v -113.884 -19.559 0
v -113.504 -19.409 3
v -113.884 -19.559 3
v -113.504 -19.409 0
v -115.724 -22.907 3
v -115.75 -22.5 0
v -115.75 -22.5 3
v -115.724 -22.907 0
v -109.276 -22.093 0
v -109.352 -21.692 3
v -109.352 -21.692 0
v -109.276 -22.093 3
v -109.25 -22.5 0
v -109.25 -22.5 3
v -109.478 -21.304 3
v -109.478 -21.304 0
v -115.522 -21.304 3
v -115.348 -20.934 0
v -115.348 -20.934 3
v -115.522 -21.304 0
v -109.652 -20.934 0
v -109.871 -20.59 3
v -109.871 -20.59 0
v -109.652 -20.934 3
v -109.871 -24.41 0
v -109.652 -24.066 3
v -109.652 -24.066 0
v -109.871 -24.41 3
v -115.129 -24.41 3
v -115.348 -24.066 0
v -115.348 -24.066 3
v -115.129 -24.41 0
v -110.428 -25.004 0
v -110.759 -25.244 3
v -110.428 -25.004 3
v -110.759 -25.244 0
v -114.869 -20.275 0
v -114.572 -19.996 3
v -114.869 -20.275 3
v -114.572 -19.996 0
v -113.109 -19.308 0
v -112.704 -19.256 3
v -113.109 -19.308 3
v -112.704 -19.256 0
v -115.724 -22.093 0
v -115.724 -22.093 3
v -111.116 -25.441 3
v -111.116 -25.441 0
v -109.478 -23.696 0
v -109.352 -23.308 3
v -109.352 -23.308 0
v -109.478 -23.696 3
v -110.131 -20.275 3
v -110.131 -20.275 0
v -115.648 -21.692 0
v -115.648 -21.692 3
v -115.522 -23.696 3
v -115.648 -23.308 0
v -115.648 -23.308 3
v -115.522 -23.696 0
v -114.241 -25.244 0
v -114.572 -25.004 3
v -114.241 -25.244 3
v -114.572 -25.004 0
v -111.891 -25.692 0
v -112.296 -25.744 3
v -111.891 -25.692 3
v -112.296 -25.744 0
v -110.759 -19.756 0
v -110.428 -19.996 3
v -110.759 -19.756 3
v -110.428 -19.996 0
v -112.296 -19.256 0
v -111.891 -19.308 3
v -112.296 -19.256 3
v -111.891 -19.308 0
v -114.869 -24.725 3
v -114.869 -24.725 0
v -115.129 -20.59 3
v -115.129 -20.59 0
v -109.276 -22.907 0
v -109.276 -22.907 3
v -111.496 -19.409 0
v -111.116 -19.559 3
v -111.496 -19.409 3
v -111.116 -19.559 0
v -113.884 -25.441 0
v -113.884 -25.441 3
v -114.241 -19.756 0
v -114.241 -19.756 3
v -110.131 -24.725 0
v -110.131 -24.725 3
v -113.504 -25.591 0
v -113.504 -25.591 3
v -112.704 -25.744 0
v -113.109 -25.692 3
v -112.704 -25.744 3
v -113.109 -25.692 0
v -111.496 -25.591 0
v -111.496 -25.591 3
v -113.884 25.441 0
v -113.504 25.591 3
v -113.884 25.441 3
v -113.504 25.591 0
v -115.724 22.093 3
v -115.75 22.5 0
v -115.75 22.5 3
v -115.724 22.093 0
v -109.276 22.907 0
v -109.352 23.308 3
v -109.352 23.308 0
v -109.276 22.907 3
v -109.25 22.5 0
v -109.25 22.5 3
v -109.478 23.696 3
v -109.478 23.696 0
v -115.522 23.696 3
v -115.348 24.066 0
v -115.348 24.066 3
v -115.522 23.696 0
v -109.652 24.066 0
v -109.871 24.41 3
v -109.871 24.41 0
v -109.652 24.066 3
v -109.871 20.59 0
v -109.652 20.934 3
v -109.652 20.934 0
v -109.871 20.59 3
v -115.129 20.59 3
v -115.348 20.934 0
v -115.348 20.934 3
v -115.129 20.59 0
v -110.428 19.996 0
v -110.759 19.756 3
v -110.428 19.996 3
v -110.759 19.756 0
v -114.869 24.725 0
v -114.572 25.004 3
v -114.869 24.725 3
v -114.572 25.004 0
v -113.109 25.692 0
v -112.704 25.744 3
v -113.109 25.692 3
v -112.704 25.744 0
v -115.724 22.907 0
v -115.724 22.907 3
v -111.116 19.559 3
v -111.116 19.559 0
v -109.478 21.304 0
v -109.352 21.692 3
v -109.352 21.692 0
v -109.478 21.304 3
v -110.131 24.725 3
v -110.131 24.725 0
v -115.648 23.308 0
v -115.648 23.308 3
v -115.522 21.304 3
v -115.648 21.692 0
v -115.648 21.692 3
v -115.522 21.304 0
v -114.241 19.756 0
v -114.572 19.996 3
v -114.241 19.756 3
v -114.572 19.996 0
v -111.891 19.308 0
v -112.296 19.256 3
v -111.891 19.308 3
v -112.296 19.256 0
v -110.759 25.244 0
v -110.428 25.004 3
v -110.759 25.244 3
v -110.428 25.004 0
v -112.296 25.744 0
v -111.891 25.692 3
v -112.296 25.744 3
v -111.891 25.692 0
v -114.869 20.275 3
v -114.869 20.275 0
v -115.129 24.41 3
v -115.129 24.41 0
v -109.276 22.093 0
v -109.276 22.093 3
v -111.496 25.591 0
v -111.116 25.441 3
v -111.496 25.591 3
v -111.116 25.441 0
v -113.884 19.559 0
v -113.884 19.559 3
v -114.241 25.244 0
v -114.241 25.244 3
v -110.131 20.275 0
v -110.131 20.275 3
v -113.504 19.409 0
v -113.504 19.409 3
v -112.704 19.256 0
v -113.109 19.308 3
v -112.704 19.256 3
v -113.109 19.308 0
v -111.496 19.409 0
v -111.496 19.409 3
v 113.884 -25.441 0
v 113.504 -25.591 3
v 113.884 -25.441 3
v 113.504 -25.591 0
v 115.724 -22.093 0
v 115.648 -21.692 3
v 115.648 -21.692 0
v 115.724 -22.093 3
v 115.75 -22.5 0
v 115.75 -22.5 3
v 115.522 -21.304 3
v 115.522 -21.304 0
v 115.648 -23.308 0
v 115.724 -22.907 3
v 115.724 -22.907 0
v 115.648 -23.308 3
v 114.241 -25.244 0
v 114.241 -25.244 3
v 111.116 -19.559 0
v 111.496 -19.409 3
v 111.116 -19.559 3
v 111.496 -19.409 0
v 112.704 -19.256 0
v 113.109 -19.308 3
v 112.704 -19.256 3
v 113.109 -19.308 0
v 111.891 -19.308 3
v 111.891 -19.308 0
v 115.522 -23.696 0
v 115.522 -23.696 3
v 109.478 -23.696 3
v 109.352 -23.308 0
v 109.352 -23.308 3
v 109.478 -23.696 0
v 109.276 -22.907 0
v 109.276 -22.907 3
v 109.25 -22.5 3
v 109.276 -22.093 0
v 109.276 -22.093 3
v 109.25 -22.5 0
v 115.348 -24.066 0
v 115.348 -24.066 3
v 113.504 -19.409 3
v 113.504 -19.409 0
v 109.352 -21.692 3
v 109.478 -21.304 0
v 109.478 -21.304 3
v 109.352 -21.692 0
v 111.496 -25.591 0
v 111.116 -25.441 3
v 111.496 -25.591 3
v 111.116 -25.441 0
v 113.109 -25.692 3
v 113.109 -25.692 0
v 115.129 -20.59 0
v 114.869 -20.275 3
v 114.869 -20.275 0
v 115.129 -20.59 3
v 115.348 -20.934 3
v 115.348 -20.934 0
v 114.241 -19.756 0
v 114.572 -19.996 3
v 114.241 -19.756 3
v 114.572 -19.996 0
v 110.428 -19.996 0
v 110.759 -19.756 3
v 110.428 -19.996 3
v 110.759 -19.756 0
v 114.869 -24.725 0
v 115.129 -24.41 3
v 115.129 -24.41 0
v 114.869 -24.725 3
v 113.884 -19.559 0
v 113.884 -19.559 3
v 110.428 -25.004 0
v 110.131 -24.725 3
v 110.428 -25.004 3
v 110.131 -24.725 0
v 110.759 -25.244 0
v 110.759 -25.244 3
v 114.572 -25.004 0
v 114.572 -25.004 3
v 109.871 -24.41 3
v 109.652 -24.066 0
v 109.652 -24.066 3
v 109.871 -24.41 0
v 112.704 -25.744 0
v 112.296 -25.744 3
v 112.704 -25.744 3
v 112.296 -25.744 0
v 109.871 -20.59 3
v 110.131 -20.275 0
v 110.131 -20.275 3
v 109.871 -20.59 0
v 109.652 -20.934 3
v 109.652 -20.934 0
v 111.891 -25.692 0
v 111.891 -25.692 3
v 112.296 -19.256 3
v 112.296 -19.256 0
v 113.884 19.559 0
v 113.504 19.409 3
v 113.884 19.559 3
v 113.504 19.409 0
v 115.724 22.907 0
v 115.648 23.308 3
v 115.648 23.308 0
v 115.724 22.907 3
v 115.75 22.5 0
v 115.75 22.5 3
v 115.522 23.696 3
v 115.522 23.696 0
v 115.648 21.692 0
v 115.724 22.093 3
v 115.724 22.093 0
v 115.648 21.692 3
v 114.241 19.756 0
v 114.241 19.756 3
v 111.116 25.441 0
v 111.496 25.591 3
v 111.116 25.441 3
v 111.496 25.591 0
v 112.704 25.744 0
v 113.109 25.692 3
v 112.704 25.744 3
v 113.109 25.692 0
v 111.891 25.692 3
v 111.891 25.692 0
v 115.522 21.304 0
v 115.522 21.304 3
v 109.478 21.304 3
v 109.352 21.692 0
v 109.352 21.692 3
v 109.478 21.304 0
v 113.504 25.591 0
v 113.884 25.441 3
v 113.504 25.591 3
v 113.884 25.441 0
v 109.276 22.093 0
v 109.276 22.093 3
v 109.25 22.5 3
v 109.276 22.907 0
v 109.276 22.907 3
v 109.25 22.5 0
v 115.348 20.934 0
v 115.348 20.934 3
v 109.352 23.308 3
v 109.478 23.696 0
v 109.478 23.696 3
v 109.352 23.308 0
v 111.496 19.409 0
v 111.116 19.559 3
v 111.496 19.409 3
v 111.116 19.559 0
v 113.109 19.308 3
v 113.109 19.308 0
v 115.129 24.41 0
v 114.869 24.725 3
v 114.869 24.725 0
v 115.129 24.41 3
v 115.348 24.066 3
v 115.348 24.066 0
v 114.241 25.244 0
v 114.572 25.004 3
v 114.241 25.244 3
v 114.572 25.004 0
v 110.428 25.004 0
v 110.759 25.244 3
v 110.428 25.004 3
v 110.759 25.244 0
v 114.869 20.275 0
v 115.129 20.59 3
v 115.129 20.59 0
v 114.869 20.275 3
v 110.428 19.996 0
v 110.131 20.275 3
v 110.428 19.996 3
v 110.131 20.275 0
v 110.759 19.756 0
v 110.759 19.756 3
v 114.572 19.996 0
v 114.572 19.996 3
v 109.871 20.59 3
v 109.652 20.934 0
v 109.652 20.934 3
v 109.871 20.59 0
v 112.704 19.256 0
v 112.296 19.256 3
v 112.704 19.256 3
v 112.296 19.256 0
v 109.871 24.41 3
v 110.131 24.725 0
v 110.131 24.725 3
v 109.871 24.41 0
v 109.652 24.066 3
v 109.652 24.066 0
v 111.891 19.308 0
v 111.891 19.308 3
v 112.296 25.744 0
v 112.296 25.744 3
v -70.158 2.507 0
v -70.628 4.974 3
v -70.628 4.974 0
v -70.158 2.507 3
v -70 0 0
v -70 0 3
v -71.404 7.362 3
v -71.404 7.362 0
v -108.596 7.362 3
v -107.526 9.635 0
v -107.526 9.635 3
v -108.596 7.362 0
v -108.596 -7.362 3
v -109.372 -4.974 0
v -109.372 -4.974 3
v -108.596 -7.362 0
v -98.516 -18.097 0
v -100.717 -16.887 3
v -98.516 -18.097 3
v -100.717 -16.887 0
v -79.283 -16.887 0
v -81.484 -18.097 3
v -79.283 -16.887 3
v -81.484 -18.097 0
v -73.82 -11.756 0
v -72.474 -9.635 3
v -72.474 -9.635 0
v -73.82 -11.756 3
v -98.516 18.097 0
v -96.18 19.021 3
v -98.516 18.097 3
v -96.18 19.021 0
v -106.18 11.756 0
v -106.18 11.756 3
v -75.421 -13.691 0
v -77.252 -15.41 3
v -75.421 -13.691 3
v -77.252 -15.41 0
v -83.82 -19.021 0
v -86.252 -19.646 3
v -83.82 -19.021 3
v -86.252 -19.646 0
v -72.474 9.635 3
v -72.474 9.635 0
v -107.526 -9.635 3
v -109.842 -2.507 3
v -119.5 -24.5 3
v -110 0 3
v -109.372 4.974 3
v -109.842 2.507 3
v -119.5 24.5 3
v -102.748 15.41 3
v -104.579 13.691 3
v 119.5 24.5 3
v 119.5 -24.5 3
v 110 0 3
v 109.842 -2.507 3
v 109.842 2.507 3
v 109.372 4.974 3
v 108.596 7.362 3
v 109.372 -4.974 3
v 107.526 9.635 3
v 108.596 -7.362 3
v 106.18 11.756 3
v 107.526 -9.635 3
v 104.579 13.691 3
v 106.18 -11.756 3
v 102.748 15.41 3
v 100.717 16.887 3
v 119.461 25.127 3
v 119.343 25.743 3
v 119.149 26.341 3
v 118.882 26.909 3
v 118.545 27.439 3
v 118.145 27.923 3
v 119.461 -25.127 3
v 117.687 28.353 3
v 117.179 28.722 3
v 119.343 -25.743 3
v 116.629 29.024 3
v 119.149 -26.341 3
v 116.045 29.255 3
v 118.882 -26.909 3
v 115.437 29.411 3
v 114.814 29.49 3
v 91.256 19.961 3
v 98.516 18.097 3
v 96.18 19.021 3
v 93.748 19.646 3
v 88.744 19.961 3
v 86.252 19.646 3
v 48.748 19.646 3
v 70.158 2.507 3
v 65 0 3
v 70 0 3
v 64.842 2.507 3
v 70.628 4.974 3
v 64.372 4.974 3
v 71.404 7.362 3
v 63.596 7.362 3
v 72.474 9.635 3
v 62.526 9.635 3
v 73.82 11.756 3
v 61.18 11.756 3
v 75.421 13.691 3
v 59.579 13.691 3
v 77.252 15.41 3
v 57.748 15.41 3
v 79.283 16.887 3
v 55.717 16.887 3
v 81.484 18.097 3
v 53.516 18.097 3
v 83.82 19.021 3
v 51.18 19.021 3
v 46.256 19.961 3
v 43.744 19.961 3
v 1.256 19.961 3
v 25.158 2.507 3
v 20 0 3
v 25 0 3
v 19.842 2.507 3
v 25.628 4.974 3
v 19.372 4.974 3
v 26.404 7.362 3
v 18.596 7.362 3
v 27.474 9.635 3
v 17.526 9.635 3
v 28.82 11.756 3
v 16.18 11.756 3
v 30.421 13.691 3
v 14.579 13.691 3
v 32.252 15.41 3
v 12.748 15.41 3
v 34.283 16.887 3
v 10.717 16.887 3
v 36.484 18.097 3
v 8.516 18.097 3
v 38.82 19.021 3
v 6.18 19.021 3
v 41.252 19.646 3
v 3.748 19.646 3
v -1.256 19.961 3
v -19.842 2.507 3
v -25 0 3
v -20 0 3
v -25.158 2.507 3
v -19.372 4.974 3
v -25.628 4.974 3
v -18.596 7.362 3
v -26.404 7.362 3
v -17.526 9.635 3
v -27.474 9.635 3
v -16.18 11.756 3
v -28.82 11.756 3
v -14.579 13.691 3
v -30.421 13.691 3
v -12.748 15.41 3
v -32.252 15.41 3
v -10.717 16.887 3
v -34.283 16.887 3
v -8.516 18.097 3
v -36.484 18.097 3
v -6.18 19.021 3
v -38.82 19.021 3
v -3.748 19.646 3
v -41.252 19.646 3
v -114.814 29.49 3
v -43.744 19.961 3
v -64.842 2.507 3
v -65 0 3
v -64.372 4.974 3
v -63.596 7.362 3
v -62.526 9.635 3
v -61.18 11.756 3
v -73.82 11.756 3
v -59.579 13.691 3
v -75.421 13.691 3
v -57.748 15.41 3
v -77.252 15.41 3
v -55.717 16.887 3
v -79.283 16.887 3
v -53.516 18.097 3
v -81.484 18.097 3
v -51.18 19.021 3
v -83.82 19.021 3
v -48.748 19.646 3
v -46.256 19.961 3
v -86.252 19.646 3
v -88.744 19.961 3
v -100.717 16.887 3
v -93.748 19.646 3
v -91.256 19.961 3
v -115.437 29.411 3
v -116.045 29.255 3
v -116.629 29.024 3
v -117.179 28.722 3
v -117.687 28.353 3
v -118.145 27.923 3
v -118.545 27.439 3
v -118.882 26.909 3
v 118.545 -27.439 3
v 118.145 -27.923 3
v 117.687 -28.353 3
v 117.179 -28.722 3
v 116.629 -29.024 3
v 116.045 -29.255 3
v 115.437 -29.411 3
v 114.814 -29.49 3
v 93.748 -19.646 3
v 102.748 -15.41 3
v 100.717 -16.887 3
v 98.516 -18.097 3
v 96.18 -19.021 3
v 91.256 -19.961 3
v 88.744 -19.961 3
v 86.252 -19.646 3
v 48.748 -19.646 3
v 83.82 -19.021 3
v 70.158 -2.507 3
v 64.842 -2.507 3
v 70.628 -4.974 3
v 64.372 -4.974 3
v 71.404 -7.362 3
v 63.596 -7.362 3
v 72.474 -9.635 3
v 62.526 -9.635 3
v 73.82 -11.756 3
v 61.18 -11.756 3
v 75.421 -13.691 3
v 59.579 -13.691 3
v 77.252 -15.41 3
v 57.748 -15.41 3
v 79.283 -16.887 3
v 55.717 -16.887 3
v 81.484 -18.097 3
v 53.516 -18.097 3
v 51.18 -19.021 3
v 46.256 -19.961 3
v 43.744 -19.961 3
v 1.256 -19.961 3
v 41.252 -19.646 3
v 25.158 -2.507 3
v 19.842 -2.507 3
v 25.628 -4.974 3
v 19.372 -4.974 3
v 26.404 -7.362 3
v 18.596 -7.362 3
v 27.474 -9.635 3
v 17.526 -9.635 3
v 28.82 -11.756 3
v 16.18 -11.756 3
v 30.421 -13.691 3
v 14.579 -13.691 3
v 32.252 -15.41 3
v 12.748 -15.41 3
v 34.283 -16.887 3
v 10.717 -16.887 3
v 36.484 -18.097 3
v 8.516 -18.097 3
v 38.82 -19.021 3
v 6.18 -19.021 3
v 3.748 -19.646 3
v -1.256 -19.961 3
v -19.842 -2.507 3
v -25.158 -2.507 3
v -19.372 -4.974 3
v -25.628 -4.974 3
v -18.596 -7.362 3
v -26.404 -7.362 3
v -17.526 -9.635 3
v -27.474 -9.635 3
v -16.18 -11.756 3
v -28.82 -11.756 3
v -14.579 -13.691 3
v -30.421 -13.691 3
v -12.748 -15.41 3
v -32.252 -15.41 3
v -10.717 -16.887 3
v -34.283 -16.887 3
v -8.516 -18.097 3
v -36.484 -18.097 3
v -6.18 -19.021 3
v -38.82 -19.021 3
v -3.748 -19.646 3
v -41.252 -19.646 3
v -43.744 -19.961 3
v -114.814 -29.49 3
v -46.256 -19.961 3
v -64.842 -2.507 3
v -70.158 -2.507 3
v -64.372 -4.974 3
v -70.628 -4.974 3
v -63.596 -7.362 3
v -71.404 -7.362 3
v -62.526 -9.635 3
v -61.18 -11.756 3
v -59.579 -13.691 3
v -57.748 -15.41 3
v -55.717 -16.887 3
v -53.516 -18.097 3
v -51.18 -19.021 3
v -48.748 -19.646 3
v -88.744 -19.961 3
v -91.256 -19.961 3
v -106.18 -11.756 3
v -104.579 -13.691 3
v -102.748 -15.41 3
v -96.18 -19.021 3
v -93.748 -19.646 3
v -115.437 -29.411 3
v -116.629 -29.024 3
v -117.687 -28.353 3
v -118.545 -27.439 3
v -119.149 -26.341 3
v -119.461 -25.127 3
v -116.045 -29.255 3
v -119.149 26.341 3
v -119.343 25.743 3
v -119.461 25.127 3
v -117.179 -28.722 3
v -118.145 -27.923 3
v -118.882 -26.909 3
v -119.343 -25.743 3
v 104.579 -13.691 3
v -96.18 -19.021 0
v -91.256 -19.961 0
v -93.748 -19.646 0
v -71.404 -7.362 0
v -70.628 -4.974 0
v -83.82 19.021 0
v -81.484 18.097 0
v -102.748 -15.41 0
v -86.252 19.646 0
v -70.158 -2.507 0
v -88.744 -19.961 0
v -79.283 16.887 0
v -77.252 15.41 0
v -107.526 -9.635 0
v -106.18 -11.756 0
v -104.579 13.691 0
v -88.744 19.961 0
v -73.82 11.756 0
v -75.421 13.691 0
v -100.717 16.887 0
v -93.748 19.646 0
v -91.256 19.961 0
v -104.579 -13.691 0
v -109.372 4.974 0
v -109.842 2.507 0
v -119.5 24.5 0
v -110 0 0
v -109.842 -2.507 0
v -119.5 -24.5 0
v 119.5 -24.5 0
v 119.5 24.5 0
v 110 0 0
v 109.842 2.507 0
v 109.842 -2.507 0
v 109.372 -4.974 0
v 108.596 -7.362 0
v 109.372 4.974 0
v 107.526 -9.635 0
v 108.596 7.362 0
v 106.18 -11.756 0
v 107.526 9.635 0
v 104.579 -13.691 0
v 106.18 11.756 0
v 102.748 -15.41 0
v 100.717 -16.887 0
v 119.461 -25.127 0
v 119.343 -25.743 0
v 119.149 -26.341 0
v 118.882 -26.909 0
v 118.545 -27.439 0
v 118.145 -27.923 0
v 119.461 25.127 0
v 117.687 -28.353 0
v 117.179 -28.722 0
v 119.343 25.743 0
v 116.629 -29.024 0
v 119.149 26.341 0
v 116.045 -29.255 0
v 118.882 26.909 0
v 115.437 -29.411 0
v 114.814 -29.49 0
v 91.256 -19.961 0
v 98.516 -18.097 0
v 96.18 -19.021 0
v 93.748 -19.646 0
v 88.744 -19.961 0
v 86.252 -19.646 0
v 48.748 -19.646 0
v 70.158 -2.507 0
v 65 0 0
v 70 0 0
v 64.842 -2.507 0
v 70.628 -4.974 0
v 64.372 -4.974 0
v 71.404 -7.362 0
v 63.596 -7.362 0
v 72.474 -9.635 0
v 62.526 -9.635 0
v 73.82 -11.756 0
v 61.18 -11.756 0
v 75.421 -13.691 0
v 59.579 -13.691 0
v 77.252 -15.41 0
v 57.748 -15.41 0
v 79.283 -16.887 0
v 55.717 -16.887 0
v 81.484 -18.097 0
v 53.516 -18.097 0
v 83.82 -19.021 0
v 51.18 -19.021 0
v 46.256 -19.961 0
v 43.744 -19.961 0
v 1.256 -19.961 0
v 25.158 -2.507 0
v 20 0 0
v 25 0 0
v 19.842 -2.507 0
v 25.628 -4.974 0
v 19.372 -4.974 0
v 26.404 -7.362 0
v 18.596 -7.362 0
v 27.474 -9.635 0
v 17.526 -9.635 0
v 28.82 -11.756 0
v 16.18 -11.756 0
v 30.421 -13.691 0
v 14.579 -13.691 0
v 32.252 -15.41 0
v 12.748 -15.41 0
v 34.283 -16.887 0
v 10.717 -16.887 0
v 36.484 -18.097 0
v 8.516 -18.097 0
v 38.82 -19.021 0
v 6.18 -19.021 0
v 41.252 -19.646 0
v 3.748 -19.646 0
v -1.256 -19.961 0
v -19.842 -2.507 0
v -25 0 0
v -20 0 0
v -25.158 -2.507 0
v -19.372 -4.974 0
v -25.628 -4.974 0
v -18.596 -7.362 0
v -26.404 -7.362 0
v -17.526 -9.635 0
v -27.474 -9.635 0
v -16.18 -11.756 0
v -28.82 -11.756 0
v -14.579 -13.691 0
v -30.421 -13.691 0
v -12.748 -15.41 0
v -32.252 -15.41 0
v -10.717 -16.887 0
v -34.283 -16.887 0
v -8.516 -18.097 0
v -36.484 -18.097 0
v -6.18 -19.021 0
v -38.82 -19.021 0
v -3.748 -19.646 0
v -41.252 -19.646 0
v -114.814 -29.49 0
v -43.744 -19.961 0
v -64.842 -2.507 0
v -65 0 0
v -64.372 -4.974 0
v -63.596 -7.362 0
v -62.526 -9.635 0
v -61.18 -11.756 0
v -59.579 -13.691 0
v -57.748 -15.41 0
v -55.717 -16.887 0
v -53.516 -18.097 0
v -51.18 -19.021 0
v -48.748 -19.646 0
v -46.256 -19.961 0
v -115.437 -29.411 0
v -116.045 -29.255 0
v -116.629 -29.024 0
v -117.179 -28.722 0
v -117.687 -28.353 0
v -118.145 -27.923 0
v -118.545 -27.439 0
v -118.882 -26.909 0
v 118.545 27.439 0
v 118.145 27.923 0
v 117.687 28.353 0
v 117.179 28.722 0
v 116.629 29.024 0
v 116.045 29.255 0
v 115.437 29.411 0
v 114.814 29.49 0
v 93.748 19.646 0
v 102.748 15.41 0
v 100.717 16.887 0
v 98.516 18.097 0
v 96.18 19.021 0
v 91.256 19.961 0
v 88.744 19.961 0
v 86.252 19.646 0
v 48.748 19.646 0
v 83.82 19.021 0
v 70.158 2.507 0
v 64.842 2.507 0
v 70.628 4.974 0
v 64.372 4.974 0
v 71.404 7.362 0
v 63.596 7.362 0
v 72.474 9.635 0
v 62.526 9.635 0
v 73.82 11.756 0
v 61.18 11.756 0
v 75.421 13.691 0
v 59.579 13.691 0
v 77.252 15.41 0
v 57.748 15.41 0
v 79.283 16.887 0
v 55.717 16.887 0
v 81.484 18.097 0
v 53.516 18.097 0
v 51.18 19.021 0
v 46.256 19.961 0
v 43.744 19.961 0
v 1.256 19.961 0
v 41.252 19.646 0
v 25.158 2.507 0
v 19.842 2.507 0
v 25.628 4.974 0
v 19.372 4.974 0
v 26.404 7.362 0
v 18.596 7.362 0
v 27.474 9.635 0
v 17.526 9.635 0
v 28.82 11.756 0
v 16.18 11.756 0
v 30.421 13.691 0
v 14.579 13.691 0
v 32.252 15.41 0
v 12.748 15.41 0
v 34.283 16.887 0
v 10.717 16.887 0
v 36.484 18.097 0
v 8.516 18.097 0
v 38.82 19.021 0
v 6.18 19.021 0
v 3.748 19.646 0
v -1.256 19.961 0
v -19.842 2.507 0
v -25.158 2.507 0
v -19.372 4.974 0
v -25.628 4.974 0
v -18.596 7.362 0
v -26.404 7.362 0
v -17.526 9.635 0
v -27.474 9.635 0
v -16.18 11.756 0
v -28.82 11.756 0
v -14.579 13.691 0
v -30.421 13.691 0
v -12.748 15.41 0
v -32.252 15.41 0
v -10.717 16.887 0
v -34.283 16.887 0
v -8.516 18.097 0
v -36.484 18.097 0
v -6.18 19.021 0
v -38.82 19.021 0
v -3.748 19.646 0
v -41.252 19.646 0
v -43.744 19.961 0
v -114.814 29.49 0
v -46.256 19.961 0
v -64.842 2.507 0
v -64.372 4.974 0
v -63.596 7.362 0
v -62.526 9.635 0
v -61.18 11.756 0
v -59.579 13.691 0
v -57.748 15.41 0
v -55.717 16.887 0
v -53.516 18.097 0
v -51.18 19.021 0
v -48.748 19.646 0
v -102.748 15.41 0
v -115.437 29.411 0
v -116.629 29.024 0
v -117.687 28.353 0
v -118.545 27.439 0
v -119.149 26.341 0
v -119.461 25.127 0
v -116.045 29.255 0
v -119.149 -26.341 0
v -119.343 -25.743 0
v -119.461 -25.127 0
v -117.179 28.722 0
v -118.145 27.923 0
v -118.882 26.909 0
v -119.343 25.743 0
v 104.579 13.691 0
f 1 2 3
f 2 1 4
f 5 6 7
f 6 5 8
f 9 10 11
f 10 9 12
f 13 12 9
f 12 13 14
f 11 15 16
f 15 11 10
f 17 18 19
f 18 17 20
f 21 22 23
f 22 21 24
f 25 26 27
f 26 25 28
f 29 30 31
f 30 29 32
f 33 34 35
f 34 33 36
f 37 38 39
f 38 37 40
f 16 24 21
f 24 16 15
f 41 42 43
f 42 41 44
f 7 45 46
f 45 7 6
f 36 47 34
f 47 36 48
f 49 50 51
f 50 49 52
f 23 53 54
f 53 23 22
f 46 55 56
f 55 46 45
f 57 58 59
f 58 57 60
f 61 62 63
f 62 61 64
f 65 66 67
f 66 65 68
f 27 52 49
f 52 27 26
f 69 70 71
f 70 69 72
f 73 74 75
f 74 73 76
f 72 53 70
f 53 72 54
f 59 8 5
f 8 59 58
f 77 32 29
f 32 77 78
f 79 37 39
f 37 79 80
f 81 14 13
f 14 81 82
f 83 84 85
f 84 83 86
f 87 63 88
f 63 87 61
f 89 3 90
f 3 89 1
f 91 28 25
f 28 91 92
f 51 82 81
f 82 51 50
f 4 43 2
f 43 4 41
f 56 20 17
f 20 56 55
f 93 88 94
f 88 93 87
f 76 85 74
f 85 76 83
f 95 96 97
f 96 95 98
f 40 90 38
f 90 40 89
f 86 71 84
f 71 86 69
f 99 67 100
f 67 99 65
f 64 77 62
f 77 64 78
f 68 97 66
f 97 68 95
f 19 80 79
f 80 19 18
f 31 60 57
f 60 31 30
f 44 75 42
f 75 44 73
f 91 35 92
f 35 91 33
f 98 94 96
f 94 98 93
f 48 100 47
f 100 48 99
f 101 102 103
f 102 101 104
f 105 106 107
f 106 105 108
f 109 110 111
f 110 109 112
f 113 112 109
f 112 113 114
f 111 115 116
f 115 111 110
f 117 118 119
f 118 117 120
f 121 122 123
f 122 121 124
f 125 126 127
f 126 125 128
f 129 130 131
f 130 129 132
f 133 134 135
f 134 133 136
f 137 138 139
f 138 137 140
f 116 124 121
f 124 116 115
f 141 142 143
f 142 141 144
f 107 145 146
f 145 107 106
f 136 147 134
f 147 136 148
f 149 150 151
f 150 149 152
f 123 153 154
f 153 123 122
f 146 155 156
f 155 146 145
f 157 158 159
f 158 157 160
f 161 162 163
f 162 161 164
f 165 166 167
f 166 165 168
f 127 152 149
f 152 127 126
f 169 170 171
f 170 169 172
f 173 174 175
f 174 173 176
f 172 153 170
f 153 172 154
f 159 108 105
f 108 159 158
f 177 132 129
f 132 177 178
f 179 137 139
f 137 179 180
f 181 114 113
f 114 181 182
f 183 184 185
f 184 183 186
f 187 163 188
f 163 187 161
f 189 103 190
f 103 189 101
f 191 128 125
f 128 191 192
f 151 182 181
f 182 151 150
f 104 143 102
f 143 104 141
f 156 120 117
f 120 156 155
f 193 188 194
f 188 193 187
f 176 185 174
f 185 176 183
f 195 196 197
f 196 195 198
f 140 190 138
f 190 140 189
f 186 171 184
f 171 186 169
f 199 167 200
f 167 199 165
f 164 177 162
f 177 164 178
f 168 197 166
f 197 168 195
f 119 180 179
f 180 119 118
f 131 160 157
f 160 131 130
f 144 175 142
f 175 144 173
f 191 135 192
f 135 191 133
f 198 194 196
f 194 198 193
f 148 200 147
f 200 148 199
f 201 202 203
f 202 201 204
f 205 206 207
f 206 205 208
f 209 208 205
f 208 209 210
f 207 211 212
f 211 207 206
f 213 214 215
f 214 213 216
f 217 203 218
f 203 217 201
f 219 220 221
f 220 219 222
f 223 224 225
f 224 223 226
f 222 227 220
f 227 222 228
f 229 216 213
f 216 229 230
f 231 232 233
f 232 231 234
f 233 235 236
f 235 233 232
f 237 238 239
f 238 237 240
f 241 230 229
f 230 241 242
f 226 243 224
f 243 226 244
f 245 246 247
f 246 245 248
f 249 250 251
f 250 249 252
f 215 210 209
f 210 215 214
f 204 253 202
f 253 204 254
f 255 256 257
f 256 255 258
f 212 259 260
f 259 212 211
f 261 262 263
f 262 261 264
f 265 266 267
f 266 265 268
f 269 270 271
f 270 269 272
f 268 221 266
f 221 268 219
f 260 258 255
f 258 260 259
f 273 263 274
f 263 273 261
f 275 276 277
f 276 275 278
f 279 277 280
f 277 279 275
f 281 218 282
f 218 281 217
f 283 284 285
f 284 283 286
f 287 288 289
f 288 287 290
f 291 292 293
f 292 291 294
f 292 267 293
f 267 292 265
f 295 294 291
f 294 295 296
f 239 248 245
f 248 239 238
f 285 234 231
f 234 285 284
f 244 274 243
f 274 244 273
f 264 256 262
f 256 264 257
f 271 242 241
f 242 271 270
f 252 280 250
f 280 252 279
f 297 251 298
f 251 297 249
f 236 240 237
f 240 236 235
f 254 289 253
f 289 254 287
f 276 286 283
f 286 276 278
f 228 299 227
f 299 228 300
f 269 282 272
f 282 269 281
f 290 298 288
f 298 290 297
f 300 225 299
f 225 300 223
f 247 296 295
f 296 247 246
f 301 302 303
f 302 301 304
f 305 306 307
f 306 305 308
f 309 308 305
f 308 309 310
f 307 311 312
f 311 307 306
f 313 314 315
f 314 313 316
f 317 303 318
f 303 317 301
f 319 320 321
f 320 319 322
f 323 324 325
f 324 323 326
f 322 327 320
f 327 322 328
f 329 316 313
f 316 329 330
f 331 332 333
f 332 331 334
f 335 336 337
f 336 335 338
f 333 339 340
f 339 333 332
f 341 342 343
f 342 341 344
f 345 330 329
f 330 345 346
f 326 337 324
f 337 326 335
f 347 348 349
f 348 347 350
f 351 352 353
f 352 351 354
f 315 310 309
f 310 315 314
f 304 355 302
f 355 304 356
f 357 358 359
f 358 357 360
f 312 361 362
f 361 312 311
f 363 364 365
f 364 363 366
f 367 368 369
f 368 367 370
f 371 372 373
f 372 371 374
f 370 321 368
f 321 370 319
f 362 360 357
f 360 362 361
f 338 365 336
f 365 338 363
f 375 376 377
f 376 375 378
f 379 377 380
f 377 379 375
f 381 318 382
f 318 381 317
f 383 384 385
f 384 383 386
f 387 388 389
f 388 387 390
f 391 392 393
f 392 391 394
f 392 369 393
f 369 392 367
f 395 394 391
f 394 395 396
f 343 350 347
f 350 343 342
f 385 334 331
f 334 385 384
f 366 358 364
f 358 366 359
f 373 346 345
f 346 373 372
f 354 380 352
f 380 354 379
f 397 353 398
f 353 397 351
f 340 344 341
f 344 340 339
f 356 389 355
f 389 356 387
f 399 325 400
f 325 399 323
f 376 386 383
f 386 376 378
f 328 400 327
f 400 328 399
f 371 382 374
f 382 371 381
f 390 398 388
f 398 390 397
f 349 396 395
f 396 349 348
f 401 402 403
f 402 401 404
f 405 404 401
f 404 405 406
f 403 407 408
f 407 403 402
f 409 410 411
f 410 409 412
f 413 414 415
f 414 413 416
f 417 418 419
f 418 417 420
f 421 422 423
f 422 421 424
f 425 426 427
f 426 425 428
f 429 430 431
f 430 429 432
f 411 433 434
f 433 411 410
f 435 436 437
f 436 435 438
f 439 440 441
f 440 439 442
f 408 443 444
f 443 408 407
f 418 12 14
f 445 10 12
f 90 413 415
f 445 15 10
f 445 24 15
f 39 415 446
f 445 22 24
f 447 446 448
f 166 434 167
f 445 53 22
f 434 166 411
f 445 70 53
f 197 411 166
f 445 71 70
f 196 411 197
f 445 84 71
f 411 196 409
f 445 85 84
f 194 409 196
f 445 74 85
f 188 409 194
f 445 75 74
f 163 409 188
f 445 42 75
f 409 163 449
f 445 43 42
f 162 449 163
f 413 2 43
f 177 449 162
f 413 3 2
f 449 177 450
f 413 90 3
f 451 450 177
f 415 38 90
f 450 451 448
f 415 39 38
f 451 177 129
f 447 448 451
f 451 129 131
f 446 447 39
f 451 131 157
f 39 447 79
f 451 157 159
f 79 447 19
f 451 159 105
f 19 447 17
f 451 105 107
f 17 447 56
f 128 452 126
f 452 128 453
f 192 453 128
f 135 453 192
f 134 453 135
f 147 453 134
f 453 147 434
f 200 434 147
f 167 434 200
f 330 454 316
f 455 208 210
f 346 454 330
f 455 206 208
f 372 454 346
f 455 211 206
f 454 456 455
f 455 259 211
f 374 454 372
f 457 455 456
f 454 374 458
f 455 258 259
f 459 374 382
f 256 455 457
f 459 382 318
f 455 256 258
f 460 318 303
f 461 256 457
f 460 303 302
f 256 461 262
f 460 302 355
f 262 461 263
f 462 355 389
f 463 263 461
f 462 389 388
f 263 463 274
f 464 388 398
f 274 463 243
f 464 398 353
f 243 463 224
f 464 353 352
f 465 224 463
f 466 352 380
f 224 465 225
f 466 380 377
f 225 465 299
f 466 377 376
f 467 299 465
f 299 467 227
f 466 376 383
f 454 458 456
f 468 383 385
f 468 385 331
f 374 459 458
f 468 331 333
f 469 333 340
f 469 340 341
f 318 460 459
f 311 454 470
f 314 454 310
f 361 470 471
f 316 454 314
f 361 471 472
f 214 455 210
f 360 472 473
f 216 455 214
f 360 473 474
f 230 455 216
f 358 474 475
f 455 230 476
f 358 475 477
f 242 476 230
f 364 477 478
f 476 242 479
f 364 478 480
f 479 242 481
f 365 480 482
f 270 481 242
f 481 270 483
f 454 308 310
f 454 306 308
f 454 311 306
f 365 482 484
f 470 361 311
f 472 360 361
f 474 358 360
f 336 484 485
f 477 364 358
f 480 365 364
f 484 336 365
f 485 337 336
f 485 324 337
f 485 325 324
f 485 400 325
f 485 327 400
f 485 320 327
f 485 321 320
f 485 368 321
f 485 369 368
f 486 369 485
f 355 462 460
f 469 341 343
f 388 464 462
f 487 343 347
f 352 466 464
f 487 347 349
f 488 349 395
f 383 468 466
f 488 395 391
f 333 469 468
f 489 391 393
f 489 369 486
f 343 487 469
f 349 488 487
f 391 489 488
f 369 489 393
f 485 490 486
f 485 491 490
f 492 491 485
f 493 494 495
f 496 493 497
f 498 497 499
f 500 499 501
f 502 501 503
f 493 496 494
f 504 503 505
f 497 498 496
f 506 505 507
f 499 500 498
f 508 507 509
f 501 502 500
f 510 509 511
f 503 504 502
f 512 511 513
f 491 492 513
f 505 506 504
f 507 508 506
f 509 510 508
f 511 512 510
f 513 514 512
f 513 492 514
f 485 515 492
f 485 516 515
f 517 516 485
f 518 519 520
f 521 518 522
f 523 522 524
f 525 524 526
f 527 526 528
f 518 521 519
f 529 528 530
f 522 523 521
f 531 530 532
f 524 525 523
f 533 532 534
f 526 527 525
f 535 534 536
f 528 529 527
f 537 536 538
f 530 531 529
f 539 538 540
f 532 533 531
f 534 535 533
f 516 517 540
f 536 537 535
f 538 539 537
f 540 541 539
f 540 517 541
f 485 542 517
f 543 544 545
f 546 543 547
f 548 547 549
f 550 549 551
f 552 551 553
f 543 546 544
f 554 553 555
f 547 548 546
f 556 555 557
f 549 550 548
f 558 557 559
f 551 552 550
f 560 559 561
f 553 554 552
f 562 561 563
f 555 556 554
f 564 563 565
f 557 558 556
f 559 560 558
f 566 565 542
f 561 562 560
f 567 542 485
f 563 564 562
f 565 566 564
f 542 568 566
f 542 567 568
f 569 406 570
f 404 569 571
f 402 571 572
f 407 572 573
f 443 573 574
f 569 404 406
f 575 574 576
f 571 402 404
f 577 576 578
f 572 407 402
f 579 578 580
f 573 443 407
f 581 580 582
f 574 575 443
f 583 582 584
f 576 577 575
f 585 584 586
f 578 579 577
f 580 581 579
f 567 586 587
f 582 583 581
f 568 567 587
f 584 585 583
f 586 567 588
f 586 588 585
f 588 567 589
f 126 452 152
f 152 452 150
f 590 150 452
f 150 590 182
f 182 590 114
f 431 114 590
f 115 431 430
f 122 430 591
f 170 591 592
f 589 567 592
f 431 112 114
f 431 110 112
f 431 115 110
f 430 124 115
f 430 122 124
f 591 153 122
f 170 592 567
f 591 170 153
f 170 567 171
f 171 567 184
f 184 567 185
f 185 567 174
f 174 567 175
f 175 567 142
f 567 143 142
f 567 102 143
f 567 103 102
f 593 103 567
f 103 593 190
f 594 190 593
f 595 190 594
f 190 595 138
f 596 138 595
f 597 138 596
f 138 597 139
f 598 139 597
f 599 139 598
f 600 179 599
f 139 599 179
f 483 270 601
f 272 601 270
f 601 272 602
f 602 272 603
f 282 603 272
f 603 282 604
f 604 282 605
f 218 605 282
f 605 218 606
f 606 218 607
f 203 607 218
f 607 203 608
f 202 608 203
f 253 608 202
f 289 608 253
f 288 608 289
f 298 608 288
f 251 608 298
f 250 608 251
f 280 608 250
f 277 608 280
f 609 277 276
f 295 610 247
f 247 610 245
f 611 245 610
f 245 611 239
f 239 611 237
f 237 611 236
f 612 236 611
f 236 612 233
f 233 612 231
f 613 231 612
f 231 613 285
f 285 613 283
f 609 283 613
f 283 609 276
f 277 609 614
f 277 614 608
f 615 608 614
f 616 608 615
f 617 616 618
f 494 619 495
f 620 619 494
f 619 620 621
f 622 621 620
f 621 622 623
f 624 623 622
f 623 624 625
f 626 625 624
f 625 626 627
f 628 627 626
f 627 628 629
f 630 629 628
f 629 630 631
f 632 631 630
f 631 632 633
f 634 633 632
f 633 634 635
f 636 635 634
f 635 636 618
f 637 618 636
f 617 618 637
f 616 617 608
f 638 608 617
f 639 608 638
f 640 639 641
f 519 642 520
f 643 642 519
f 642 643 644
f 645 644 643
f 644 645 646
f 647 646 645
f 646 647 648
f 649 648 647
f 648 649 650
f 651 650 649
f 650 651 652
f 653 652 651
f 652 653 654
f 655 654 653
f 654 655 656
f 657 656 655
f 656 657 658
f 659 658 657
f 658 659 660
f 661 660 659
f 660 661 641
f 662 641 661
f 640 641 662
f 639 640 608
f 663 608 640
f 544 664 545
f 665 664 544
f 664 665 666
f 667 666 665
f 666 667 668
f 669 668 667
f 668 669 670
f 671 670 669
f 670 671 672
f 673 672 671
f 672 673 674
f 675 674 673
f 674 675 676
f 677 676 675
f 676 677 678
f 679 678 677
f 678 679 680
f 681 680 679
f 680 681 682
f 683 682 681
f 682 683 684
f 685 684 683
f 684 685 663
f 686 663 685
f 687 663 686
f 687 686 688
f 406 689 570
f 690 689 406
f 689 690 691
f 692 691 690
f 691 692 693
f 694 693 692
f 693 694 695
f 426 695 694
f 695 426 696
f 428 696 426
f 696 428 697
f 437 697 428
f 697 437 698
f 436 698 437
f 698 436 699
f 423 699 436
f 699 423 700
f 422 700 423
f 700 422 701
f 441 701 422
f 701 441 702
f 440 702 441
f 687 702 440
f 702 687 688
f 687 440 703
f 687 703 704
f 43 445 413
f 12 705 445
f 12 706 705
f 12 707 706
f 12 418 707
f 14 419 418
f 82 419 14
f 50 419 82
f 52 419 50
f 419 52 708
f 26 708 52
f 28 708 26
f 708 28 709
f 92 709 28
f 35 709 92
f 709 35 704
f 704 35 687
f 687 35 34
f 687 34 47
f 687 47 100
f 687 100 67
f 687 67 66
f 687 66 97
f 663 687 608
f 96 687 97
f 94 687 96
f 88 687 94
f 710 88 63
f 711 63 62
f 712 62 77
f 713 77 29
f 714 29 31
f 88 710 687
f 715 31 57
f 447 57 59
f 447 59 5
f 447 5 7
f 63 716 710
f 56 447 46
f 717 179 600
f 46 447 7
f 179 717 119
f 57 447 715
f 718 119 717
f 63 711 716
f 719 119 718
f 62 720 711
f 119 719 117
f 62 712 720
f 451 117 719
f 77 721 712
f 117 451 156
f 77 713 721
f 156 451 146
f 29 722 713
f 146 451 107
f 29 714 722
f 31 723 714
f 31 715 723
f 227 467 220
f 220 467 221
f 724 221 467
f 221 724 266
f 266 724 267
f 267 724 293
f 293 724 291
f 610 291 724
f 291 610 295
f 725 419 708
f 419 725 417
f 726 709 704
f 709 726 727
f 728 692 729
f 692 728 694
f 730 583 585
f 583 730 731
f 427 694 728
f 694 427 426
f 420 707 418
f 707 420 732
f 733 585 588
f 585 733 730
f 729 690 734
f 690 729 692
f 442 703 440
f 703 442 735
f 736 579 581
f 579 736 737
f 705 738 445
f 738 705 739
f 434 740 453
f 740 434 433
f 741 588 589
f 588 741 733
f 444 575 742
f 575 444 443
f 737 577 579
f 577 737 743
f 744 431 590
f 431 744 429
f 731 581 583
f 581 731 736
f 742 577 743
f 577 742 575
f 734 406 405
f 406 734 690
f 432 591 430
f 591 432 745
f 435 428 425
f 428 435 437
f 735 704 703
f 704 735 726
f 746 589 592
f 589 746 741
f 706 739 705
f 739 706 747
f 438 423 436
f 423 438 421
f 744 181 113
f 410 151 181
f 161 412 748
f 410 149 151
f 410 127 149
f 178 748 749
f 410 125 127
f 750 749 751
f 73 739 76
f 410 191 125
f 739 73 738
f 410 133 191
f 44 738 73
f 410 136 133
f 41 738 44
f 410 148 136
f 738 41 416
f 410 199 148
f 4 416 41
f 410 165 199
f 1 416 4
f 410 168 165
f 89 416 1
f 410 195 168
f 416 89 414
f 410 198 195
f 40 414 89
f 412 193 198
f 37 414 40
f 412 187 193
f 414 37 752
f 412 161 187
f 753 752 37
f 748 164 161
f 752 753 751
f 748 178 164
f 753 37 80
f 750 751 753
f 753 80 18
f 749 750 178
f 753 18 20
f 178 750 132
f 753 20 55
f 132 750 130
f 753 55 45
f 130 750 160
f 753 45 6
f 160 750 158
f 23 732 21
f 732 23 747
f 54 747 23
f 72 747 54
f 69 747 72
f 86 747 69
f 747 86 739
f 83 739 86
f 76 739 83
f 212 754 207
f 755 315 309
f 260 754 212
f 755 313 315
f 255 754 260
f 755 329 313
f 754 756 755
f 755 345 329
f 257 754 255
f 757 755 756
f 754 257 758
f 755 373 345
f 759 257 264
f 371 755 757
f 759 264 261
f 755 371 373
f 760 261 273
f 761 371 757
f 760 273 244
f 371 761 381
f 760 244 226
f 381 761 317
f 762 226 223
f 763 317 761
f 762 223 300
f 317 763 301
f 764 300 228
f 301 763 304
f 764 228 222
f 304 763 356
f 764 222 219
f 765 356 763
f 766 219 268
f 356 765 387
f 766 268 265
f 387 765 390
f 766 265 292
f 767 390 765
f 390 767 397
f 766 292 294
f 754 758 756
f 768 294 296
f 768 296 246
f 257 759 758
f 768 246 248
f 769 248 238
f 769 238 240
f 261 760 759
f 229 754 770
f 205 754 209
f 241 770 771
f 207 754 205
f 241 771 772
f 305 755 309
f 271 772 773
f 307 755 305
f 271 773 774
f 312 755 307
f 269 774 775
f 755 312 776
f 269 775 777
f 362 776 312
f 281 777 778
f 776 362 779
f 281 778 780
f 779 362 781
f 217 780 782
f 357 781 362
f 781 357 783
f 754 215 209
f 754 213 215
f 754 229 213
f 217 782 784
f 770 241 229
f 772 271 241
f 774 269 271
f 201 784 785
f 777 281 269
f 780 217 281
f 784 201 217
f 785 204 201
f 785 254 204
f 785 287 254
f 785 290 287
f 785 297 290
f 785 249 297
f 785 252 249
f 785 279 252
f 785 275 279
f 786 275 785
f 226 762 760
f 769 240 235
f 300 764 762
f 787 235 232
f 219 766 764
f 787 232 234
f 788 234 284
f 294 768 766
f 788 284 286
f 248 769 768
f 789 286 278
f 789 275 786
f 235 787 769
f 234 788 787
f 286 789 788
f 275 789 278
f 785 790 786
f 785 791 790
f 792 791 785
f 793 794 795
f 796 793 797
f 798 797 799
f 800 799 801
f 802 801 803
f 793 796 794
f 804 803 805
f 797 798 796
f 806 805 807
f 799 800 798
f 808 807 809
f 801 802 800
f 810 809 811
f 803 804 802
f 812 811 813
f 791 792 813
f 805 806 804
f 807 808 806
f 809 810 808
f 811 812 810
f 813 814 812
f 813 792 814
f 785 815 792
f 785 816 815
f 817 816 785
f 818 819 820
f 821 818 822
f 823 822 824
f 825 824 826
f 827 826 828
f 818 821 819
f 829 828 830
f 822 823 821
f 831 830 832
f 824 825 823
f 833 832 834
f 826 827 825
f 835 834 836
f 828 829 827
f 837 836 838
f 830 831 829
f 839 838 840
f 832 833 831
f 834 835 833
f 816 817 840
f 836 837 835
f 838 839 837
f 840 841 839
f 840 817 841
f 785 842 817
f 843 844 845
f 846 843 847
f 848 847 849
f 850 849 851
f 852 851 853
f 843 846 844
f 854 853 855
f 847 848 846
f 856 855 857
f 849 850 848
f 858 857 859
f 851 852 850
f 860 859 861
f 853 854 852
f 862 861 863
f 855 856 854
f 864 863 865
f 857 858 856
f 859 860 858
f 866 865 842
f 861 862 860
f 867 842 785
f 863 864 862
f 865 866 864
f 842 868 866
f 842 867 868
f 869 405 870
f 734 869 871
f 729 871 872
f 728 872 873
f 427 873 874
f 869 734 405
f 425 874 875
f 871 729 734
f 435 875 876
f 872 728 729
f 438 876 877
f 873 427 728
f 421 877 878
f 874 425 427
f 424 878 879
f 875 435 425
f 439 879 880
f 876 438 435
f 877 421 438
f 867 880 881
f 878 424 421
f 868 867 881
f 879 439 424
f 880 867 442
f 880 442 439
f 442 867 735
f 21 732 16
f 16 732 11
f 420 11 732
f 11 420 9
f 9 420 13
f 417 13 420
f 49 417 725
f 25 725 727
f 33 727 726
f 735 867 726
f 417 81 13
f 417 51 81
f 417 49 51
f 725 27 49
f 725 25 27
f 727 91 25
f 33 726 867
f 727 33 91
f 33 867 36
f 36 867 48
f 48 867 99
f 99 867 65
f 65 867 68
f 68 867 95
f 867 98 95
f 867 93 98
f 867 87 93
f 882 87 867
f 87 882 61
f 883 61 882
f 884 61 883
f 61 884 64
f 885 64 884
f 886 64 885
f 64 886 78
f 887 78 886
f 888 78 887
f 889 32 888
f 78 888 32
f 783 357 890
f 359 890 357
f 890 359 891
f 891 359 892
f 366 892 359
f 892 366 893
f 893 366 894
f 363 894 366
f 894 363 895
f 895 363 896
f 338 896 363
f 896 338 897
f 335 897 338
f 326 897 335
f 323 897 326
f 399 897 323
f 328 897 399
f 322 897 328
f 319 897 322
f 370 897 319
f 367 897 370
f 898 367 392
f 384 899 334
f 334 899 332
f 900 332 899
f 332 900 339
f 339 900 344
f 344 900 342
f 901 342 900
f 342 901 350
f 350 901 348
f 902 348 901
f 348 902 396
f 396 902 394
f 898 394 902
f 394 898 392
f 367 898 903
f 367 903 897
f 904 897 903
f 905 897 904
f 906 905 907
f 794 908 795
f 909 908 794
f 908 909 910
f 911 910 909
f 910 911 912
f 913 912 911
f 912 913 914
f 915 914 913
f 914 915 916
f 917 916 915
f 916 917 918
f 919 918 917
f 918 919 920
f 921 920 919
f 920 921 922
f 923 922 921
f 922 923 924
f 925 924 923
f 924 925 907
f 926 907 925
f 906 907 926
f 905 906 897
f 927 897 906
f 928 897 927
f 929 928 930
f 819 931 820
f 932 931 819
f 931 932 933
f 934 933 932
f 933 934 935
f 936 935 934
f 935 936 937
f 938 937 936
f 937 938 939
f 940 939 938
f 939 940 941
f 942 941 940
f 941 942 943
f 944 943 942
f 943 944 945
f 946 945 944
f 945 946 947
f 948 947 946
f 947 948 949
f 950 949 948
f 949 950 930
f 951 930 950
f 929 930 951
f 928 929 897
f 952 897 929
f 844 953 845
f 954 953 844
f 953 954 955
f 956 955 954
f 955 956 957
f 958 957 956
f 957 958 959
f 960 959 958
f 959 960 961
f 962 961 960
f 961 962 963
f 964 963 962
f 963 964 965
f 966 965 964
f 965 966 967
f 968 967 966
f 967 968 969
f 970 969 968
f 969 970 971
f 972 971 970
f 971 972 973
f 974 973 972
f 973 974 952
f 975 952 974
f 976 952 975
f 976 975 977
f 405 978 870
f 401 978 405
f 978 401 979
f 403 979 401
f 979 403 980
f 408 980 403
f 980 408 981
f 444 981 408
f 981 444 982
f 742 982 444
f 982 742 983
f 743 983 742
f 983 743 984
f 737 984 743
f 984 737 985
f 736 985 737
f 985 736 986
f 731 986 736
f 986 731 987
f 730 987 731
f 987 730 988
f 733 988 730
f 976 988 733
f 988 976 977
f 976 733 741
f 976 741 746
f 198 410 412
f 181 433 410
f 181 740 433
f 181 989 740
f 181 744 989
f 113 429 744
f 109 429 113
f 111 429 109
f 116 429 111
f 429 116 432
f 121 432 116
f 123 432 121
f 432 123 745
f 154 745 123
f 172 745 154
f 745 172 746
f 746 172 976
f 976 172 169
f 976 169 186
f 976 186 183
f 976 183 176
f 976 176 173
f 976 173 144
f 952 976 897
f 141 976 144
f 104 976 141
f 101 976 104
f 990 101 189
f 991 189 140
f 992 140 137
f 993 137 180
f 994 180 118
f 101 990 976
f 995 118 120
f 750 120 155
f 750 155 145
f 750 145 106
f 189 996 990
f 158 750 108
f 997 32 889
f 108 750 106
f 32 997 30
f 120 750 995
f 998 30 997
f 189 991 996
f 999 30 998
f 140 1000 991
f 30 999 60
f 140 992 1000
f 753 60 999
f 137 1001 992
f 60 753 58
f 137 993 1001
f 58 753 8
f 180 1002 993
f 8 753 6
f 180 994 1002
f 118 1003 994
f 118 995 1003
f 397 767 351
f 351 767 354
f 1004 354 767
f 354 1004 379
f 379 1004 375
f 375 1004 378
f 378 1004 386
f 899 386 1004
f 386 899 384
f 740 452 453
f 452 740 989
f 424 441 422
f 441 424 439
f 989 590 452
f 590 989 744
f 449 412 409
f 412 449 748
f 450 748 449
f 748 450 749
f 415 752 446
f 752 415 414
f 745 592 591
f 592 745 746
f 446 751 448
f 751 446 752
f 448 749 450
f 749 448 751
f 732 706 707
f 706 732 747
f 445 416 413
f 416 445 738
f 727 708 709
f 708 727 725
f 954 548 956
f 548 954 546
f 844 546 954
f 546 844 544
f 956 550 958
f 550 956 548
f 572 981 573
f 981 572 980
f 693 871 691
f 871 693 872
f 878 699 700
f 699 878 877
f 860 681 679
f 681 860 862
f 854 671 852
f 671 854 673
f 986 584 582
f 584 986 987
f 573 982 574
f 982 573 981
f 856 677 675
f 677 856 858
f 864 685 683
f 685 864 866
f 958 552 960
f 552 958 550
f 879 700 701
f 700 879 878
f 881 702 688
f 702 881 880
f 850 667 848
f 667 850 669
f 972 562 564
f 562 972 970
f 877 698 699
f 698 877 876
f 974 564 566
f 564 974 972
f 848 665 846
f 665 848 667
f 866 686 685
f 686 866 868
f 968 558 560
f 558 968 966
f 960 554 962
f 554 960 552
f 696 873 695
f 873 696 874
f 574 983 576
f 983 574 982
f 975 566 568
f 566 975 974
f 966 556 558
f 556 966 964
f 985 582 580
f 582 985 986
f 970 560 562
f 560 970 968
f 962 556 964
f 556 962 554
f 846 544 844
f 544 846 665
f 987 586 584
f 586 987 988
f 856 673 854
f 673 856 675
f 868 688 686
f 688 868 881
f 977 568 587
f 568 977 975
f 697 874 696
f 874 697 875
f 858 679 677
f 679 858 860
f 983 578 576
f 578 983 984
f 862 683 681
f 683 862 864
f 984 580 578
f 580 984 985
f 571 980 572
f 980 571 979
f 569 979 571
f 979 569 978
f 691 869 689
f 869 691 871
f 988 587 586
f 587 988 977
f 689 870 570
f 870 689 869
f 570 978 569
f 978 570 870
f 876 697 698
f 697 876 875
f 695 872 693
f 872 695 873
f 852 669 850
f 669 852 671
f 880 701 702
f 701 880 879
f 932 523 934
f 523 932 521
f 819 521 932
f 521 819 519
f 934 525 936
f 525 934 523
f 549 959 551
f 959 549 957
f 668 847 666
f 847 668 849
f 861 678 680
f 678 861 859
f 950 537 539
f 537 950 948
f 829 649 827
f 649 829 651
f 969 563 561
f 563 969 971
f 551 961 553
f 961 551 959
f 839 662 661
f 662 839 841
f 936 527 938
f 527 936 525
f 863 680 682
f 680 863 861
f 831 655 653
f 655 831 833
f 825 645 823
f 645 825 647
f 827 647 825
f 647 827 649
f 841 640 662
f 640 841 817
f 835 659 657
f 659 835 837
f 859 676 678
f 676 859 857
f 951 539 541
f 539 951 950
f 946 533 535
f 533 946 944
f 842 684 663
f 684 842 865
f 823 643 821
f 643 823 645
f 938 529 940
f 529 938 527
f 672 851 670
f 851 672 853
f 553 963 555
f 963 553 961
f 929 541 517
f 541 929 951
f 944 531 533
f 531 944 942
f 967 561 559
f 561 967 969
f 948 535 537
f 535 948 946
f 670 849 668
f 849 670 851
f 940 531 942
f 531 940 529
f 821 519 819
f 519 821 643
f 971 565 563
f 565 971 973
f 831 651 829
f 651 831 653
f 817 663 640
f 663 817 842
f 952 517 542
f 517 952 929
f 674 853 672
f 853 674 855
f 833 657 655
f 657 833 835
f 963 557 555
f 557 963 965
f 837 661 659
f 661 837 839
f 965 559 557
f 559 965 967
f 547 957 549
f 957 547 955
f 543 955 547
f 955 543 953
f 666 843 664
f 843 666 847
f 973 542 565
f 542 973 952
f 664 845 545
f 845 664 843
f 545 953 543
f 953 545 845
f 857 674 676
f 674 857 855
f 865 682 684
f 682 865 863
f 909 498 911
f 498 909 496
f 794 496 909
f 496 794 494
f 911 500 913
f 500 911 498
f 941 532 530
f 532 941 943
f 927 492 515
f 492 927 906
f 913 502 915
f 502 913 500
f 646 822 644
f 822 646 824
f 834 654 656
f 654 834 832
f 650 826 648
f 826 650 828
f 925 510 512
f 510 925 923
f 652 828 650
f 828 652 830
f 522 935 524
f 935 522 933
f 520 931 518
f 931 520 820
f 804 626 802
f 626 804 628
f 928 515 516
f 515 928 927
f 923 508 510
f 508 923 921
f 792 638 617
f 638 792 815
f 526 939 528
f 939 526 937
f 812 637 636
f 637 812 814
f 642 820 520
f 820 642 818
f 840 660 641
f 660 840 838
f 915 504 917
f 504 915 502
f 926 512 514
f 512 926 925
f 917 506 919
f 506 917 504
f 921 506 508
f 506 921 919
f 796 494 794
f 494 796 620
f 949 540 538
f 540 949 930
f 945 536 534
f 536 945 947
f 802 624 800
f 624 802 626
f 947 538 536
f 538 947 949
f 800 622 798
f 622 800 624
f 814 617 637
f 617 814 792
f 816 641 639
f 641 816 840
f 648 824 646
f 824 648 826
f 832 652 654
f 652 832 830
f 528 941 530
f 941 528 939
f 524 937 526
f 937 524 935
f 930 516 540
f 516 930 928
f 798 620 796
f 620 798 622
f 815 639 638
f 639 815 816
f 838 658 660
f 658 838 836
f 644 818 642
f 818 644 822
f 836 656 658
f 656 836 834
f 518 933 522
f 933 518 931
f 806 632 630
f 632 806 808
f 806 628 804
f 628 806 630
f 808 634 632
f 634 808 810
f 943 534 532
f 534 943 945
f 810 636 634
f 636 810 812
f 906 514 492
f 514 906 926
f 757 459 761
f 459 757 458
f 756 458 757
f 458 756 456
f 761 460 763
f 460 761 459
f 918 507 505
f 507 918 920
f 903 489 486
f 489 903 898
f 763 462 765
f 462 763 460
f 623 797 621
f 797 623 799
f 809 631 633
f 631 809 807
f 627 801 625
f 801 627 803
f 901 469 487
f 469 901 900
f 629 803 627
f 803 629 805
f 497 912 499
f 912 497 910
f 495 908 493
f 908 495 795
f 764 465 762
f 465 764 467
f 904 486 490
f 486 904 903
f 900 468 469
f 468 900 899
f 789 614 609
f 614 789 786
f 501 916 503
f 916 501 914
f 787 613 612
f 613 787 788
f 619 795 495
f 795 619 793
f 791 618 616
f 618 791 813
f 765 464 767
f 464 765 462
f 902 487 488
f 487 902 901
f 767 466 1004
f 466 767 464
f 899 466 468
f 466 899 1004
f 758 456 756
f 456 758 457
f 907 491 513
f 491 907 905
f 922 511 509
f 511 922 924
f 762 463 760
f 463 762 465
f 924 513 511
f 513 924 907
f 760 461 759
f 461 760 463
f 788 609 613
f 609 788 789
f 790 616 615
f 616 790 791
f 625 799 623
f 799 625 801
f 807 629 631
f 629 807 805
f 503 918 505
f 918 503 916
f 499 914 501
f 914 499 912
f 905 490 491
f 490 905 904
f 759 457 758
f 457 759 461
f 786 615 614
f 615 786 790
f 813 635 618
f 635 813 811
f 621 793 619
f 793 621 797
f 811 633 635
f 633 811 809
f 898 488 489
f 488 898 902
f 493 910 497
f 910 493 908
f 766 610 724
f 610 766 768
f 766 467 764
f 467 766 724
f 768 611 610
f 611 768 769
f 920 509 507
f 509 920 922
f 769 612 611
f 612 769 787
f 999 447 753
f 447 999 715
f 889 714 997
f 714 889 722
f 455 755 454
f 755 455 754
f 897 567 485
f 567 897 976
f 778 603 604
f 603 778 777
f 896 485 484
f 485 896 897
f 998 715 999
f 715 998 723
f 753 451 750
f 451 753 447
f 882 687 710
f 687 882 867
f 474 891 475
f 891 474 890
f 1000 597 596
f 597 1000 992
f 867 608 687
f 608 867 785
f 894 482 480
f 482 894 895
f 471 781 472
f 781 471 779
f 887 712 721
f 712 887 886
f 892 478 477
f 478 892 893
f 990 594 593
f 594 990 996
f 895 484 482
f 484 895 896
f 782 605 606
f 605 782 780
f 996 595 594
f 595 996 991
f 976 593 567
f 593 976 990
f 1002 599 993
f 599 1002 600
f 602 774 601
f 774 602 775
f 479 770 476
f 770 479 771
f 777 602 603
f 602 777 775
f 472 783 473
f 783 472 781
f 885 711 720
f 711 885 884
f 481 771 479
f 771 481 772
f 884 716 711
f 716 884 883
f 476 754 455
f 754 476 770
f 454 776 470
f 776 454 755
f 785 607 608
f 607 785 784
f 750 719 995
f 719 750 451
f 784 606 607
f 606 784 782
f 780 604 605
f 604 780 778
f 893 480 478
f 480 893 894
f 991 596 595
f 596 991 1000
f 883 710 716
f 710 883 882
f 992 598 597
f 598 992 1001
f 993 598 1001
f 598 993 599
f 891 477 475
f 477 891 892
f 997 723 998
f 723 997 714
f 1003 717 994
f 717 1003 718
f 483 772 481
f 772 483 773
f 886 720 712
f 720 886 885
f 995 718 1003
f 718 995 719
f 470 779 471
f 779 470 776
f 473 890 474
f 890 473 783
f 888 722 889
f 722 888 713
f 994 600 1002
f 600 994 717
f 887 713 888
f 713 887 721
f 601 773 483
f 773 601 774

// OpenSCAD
$fn = 50;


difference() {
	union() {
		hull() {
			translate(v = [-114.5000000000, 24.5000000000, 0]) {
				cylinder(h = 3, r = 5);
			}
			translate(v = [114.5000000000, 24.5000000000, 0]) {
				cylinder(h = 3, r = 5);
			}
			translate(v = [-114.5000000000, -24.5000000000, 0]) {
				cylinder(h = 3, r = 5);
			}
			translate(v = [114.5000000000, -24.5000000000, 0]) {
				cylinder(h = 3, r = 5);
			}
		}
	}
	union() {
		#translate(v = [-112.5000000000, -22.5000000000, -100.0000000000]) {
			cylinder(h = 200, r = 3.2500000000);
		}
		#translate(v = [-112.5000000000, 22.5000000000, -100.0000000000]) {
			cylinder(h = 200, r = 3.2500000000);
		}
		#translate(v = [112.5000000000, -22.5000000000, -100.0000000000]) {
			cylinder(h = 200, r = 3.2500000000);
		}
		#translate(v = [112.5000000000, 22.5000000000, -100.0000000000]) {
			cylinder(h = 200, r = 3.2500000000);
		}
		#translate(v = [-90.0000000000, 0, 0]) {
			cylinder(h = 3, r = 20.0000000000);
		}
		#translate(v = [-45.0000000000, 0, 0]) {
			cylinder(h = 3, r = 20.0000000000);
		}
		#cylinder(h = 3, r = 20.0000000000);
		#translate(v = [45.0000000000, 0, 0]) {
			cylinder(h = 3, r = 20.0000000000);
		}
		#translate(v = [90.0000000000, 0, 0]) {
			cylinder(h = 3, r = 20.0000000000);
		}
	}
}
